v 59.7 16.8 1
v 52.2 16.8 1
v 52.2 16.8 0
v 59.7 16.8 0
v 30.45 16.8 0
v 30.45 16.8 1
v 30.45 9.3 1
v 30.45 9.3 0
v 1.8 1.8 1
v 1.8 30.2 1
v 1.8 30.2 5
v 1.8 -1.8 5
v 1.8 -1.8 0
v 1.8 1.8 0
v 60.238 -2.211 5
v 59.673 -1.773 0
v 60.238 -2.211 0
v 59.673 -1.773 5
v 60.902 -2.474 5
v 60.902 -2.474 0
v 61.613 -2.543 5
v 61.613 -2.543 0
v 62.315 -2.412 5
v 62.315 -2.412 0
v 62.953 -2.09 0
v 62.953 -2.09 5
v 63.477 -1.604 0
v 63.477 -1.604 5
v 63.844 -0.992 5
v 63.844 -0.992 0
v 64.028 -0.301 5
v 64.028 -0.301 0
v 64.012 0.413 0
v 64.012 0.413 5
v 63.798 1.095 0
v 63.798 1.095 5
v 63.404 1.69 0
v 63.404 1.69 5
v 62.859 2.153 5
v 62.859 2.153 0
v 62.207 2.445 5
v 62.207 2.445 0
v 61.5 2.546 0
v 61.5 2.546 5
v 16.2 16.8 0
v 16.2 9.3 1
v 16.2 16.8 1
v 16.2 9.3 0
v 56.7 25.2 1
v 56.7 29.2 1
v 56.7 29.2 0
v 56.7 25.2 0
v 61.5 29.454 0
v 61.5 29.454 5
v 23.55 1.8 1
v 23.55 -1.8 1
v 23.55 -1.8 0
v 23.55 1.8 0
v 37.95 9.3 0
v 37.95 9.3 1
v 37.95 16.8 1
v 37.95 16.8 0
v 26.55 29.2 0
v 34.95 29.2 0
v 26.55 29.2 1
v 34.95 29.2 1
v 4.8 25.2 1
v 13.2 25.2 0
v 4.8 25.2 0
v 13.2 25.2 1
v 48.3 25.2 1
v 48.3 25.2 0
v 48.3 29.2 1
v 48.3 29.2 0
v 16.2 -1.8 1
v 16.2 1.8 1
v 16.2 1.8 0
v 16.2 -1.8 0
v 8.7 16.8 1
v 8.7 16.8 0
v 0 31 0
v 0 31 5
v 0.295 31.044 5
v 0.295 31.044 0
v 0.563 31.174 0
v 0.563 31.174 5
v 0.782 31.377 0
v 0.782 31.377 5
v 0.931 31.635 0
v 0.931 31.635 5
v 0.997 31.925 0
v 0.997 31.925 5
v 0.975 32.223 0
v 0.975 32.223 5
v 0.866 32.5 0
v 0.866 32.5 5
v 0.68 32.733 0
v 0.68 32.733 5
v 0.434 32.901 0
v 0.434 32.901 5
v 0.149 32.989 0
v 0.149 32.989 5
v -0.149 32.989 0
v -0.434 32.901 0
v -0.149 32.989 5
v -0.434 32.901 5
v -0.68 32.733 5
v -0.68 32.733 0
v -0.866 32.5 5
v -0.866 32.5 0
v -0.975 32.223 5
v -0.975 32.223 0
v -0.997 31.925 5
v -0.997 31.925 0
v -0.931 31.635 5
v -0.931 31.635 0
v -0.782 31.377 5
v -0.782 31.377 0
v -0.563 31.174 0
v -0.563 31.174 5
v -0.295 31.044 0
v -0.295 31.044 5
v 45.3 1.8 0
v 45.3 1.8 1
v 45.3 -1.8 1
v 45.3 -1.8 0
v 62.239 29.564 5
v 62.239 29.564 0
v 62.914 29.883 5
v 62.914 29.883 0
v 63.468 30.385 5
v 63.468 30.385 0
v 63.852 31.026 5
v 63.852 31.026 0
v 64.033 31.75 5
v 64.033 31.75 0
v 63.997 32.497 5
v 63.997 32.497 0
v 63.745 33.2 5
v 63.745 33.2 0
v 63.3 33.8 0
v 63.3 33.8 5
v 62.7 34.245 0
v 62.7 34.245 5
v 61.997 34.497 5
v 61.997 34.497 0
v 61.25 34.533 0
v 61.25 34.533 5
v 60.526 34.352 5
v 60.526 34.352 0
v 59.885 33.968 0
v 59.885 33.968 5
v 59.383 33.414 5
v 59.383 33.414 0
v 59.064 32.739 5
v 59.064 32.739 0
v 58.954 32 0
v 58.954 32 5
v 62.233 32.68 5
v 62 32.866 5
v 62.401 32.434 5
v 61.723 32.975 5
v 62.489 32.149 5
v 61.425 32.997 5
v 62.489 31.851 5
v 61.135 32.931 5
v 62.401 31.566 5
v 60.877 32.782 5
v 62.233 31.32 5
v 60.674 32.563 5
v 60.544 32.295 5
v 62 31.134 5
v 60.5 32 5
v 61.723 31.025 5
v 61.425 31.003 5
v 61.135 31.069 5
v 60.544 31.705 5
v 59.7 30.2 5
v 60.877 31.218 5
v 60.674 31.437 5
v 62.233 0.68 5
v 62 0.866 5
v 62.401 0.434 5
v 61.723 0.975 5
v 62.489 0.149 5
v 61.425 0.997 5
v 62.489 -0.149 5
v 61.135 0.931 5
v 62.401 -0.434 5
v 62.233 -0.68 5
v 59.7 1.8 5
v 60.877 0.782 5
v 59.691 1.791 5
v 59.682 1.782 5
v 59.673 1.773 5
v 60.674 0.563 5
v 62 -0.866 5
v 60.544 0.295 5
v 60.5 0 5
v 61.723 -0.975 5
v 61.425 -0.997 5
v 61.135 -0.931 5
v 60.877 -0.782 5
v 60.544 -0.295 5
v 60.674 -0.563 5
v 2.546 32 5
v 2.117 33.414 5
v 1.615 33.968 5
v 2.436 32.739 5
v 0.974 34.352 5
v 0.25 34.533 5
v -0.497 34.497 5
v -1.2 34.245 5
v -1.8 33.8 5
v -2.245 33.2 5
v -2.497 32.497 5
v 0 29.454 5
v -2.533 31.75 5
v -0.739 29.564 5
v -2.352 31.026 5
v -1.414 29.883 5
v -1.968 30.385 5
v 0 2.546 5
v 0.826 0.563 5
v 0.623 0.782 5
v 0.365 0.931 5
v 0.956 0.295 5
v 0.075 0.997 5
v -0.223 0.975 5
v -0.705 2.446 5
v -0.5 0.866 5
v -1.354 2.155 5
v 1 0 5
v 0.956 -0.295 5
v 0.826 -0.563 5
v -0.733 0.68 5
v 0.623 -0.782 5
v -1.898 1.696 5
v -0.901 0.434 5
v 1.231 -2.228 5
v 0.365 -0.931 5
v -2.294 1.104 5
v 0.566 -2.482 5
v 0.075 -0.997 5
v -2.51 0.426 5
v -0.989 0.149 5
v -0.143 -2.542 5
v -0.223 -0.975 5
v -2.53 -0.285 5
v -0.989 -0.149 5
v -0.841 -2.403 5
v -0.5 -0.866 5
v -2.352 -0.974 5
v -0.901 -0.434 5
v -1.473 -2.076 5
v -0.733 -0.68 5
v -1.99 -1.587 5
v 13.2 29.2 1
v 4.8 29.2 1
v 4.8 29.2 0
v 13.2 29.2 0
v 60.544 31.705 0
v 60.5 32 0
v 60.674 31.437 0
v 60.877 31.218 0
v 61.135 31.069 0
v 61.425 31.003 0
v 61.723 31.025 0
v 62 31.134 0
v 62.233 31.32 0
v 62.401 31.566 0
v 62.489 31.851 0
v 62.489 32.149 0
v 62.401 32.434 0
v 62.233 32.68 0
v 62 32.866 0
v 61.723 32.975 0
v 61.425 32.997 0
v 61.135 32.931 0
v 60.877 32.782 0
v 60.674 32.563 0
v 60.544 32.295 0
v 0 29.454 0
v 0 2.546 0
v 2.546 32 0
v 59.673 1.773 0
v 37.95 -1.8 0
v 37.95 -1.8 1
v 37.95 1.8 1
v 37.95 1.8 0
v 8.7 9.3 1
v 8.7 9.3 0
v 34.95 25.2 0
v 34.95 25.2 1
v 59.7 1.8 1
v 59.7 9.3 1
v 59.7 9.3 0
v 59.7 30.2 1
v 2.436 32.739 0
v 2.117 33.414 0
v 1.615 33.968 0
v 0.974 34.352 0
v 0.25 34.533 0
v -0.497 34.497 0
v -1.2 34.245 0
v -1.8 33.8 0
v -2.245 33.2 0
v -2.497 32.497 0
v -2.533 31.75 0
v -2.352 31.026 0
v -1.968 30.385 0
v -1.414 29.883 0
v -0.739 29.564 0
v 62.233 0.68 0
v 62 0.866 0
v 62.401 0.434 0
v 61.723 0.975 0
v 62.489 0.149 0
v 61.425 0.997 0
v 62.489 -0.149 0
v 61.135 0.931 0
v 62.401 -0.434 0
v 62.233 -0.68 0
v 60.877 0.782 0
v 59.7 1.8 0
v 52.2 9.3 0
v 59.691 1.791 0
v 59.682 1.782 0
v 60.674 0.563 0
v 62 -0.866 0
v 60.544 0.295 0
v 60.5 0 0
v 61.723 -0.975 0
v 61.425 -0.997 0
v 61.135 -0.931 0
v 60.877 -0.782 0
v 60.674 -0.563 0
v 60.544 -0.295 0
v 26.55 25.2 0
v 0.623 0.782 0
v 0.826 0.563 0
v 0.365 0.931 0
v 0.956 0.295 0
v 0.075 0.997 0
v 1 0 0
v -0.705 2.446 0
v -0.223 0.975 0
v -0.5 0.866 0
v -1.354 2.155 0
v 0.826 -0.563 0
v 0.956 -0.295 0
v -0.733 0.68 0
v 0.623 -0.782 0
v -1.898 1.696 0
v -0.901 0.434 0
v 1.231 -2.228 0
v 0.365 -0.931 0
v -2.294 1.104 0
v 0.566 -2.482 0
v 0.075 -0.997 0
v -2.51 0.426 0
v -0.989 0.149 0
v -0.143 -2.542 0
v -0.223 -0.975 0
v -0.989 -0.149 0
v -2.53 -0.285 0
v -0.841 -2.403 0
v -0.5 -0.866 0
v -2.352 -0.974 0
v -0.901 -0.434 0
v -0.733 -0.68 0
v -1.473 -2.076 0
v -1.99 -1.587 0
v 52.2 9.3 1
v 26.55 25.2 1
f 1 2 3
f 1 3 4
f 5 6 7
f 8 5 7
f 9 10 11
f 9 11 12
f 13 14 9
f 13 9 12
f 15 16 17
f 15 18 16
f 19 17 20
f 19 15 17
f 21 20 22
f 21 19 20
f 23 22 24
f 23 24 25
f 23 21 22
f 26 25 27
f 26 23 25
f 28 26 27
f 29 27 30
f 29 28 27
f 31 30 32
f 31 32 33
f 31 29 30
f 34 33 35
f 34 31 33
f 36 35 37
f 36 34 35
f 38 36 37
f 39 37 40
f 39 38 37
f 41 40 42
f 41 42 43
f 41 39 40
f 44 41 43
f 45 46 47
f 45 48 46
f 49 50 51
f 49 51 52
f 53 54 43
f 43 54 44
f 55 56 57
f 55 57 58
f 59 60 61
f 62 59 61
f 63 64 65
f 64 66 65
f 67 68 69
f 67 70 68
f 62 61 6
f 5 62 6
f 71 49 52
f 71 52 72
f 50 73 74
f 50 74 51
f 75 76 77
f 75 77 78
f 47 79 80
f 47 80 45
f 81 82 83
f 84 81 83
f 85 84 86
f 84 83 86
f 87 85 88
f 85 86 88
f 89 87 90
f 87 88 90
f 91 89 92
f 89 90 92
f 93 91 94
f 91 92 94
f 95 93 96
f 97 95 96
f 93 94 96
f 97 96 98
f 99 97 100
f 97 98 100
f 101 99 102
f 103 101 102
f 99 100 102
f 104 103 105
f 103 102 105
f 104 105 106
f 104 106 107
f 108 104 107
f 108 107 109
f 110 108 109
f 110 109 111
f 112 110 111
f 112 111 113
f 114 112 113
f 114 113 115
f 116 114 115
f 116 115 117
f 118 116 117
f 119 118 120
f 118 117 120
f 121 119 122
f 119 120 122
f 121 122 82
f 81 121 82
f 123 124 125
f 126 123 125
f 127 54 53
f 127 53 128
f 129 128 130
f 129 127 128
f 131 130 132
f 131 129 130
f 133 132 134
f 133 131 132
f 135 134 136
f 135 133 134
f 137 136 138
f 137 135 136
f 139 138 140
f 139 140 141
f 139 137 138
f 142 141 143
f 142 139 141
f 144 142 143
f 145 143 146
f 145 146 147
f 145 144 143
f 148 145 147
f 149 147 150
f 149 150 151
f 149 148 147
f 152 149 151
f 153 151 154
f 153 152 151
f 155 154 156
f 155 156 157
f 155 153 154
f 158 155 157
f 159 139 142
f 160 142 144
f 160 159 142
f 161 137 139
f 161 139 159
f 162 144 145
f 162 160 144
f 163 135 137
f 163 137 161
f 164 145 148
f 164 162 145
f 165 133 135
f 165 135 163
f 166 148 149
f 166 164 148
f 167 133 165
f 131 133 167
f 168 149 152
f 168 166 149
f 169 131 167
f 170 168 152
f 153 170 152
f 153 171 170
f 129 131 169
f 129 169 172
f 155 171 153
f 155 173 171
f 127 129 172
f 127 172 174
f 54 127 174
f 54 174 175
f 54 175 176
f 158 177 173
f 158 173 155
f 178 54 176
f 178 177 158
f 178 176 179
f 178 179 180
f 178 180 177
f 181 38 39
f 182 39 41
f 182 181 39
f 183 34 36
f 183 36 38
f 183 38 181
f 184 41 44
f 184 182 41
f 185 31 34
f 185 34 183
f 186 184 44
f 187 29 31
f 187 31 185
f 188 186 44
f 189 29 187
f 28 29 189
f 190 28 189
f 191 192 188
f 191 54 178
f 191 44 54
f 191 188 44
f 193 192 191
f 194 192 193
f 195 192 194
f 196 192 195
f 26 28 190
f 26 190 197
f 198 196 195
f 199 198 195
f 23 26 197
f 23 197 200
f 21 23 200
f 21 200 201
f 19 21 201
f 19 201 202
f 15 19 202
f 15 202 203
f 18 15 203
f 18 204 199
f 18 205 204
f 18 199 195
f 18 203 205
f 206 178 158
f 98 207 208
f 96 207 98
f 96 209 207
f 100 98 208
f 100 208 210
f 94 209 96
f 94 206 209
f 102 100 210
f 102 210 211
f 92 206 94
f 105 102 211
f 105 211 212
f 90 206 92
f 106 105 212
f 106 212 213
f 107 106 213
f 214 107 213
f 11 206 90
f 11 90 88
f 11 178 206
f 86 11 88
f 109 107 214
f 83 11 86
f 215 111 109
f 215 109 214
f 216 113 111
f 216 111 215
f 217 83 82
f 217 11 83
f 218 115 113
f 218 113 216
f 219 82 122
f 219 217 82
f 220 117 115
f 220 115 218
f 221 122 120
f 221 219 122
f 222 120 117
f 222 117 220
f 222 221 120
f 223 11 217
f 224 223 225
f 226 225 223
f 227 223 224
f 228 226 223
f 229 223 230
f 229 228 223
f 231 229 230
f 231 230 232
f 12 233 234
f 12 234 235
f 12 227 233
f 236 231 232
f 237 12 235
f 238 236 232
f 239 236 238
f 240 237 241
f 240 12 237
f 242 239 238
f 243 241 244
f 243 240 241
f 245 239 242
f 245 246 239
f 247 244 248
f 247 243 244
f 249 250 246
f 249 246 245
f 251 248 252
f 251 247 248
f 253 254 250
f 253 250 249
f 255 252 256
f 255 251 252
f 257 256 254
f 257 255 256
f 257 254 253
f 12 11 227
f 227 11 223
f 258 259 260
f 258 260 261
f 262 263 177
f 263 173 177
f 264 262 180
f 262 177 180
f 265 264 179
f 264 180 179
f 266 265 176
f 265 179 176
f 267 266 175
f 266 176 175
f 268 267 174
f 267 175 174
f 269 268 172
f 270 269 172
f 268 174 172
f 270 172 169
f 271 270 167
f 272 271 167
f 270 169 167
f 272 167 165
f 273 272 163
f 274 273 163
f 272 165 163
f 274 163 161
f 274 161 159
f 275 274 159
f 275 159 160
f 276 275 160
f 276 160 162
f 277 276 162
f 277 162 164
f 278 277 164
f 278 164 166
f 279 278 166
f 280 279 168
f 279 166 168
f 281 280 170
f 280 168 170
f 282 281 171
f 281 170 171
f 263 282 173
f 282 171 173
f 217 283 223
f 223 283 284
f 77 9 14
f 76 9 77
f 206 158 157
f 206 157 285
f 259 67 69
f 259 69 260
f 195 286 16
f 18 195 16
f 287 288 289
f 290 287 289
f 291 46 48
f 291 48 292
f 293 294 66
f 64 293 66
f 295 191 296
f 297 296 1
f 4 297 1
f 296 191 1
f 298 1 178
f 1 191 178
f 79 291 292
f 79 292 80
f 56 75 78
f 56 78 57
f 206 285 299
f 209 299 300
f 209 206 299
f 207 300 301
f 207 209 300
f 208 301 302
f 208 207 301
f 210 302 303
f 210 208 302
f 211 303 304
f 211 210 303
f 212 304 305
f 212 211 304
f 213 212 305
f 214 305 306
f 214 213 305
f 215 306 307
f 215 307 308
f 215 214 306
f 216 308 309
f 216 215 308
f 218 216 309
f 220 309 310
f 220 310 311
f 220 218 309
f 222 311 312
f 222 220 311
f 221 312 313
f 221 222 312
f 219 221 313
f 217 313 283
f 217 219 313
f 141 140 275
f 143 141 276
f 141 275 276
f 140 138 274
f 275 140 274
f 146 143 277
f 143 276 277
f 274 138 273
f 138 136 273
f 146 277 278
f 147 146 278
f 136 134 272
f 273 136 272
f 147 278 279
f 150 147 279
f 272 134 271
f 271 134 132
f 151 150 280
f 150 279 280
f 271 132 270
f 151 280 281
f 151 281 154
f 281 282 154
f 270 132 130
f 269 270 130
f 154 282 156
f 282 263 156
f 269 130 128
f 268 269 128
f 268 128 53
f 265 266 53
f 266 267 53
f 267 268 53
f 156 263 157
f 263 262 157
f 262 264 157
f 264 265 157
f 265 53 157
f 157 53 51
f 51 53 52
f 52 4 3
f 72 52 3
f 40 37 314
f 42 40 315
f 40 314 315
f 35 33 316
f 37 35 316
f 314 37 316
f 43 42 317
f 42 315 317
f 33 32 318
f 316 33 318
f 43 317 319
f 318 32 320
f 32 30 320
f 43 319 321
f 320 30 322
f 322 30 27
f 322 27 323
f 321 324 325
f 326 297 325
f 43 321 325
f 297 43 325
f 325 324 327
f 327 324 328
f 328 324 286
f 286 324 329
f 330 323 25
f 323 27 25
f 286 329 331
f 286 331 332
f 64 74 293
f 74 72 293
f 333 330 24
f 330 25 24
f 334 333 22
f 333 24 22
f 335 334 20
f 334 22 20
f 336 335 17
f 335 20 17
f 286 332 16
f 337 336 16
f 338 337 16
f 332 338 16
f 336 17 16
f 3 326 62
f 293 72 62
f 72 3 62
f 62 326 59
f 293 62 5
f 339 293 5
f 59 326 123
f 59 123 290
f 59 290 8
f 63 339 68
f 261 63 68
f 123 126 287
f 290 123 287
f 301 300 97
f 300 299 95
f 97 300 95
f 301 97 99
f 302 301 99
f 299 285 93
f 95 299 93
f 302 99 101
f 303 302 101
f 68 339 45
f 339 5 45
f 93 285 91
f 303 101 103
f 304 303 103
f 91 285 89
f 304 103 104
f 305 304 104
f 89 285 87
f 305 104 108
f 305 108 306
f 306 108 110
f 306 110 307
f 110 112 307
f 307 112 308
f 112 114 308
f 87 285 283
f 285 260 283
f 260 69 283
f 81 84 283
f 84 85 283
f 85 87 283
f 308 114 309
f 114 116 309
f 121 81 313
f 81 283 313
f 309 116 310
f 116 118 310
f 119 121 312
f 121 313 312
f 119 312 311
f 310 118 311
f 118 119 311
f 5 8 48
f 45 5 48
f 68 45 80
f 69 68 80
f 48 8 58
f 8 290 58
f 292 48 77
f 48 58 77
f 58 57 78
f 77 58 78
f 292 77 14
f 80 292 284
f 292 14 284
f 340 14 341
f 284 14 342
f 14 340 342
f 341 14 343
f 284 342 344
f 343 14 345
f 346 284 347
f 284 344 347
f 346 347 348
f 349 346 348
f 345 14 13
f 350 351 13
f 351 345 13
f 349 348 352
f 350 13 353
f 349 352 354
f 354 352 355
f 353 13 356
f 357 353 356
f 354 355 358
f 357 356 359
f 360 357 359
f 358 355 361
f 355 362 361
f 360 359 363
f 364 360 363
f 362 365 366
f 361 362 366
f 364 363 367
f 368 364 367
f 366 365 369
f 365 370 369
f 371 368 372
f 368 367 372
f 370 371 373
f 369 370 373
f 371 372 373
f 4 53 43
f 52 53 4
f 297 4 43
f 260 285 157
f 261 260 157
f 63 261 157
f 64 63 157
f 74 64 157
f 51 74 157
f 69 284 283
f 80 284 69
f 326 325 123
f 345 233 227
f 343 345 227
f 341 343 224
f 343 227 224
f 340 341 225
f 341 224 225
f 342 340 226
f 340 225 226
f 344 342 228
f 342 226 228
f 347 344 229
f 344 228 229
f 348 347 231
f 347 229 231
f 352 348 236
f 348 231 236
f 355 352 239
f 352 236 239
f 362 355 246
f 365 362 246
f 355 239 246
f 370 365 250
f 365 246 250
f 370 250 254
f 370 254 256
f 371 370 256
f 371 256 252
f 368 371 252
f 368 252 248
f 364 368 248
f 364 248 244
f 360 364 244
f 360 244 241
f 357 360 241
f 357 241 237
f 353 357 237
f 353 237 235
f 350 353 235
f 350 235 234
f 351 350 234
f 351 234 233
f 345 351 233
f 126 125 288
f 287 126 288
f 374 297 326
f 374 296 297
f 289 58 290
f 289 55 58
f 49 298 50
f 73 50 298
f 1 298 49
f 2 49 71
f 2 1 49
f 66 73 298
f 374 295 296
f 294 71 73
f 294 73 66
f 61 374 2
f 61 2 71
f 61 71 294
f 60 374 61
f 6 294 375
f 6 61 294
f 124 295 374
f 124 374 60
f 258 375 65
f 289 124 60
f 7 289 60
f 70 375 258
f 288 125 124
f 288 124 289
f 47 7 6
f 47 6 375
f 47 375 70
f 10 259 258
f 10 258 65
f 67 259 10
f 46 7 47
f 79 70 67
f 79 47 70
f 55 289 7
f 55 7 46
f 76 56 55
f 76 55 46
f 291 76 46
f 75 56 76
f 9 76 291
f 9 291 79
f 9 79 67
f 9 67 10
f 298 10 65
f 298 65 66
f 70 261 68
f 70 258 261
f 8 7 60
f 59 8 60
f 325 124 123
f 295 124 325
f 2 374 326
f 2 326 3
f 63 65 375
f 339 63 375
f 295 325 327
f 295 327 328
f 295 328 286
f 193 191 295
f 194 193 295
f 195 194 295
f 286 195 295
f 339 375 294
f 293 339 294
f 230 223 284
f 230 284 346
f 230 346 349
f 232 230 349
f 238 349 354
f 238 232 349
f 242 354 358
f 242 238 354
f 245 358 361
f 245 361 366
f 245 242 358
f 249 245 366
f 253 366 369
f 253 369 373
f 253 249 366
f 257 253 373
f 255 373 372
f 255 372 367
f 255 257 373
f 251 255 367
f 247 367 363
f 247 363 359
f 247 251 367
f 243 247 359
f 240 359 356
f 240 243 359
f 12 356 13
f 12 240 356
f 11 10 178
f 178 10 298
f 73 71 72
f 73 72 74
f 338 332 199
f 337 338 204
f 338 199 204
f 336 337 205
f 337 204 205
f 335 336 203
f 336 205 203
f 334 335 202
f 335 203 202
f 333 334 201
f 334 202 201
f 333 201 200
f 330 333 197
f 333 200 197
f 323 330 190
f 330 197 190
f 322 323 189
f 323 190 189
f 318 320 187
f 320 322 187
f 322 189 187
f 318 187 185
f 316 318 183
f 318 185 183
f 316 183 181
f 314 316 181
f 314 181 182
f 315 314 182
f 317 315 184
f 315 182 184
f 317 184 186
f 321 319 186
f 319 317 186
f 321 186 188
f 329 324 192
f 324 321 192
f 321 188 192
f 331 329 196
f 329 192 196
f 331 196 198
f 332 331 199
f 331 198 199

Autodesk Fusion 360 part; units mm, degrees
sketch "Sketch1" plane through (0, 0, 0) normal (0, 0, 1) x (1, 0, 0)
  line L0 (0, 0) -> (18, 0)
  line L1 (18, 0) -> (18, 32)
  line L2 (18, 32) -> (0, 32)
  line L3 (0, 32) -> (0, 0)
  line L4 (1.8, 1.8) -> (16.2, 1.8)
  line L5 (16.2, 1.8) -> (16.2, 30.2)
  line L6 (16.2, 30.2) -> (1.8, 30.2)
  line L7 (1.8, 30.2) -> (1.8, 1.8)
  line L8 (1.8, 1.8) -> (1.8, 0)
  line L9 (16.2, 1.8) -> (16.2, 0)
  line L10 (1.8, 0) -> (1.8, -1.8)
  line L11 (16.2, 0) -> (16.2, -1.8)
  line L12 (16.2, 1.8) -> (18, 1.8)
  dimension "d1" = 18
  dimension "d2" = 32
  dimension "d3" = 28.4
  dimension "d4" = 14.4
  dimension "d5" = 1.8
  dimension "d6" = 1.8
extrude "Extrude1" add sketch "Sketch1" along normal blind 1 contours L4 L5 L6 L7 makes body 1
extrude "Extrude3" add sketch "Sketch1" along normal blind 5 separate body contours L0 L1 L2 L3 L5 L6 L7 L8 L12 | L0 L1 L9 L12 makes body 2
sketch "Sketch3" plane through (0, 30.2, 0) normal (0, -1, 0) x (1, 0, 0)
  line L0 (1.8, 0) -> (16.2, 0)
  line L1 (16.2, 0) -> (16.2, 5)
  line L2 (16.2, 5) -> (1.8, 5)
  line L3 (1.8, 5) -> (1.8, 0)
  line L4 (3.3, 1) -> (14.7, 1)
  line L5 (14.7, 1) -> (14.7, 4)
  line L6 (14.7, 4) -> (3.3, 4)
  line L7 (3.3, 4) -> (3.3, 1)
  dimension "d13" = 3
  dimension "d14" = 1.5
  dimension "d15" = 1.5
sketch "Sketch4" plane through (0, 0, 1) normal (0, 0, 1) x (-1, 0, 0)
  line L0 (-1.8, -30.2) -> (-1.8, -1.8)
  line L1 (-1.8, -1.8) -> (-16.2, -1.8)
  line L2 (-16.2, -1.8) -> (-16.2, -30.2)
  line L3 (-16.2, -30.2) -> (-1.8, -30.2)
  line L4 (-13.5403, -1.8) -> (-13.5403, -9.3)
  line L5 (-16.2, -9.3) -> (-8.7, -9.3)
  line L6 (-8.7, -9.3) -> (-8.7, -16.8)
  line L7 (-8.7, -16.8) -> (-16.2, -16.8)
  line L8 (-16.2, -16.8) -> (-16.2, -9.3)
  dimension "d18" = 7.5
  dimension "d19" = 7.5
  dimension "d20" = 7.5
extrude "Extrude5" cut sketch "Sketch4" against normal blind 1 contours L2 L5 L6 L7 L8 bodies 1
sketch "Sketch5" plane through (0, 0, 1) normal (0, 0, 1) x (-1, 0, 0)
  line L0 (-8.7, -16.8) -> (-16.2, -16.8)
  line L1 (-16.2, -16.8) -> (-16.2, -30.2)
  line L2 (-16.2, -30.2) -> (-1.8, -30.2)
  line L3 (-1.8, -30.2) -> (-1.8, -1.8)
  line L4 (-1.8, -1.8) -> (-16.2, -1.8)
  line L5 (-16.2, -1.8) -> (-16.2, -9.3)
  line L6 (-16.2, -9.3) -> (-8.7, -9.3)
  line L7 (-8.7, -9.3) -> (-8.7, -16.8)
  line L8 (-9, -30.2) -> (-9, -25.2) construction
  line L9 (-1.8, -25.2) -> (-4.8, -25.2) construction
  line L10 (-16.2, -25.2) -> (-13.2, -25.2) construction
  line L11 (-8.3545, -30.2) -> (-8.3545, -29.2)
  line L12 (-13.2, -25.2) -> (-4.8, -25.2)
  line L13 (-4.8, -25.2) -> (-4.8, -29.2)
  line L14 (-4.8, -29.2) -> (-13.2, -29.2)
  line L15 (-13.2, -29.2) -> (-13.2, -25.2)
  dimension "d24" = 3
  dimension "d25" = 3
  dimension "d26" = 1
  dimension "d27" = 5
  dimension "d28" = 4
sketch "Sketch7" plane through (0, 0, 5) normal (0, 0, 1) x (-1, 0, 0)
  line L0 (-16.2, -30.2) -> (-16.2, 0)
  line L1 (-16.2, 0) -> (-18, 0)
  line L2 (-18, 0) -> (-18, -32)
  line L3 (-18, -32) -> (0, -32)
  line L4 (0, -32) -> (0, 0)
  line L5 (0, 0) -> (-1.8, 0)
  line L6 (-1.8, 0) -> (-1.8, -30.2)
  line L7 (-1.8, -30.2) -> (-16.2, -30.2)
  line L8 (-16.2, -30.2) -> (-18, -30.2)
  line L9 (-16.2, 0) -> (-18, 0)
extrude "Extrude9" cut sketch "Sketch7" against normal blind 4 contours L0 L1 L2 L8 L9 bodies 2
combine "Combine2" operation add target body 2 tool bodies 1
extrude "Extrude6" cut sketch "Sketch5" against normal blind 1 contours L12 L13 L14 L15 bodies 2
sketch "Sketch9" plane through (0, 0, 1) normal (0, 0, 1) x (-1, 0, 0)
  line L0 (-4.8, -25.2) -> (-4.8, -29.2)
  line L1 (-4.8, -29.2) -> (-13.2, -29.2)
  line L2 (-13.2, -29.2) -> (-13.2, -25.2)
  line L3 (-13.2, -25.2) -> (-4.8, -25.2)
  line L4 (-16.2, -1.8) -> (-16.2, 0)
  line L5 (-16.2, 0) -> (-18, 0)
  line L6 (-18, 0) -> (-18, -30.2)
  line L7 (-18, -30.2) -> (-1.8, -30.2)
  line L8 (-1.8, -30.2) -> (-1.8, -1.8)
  line L9 (-1.8, -1.8) -> (-16.2, -1.8)
  line L10 (-16.2, -9.3) -> (-8.7, -9.3)
  line L11 (-8.7, -9.3) -> (-8.7, -16.8)
  line L12 (-8.7, -16.8) -> (-16.2, -16.8)
  line L13 (-16.2, -16.8) -> (-16.2, -9.3)
  line L14 (-9, -34.6502) -> (-30.75, -34.6502)
  line L15 (-30.75, -34.6502) -> (-52.5, -34.6502)
  line L16 (-52.5, -34.6502) -> (-59.7, -34.6502)
  line L17 (-59.7, -34.6502) -> (-61.5, -34.6502)
  line L18 (-18, -32) -> (-61.5, -32)
  line L19 (-61.5, -32) -> (-61.5, 0)
  line L20 (-61.5, 0) -> (-18, 0)
  line L21 (-18, 0) -> (-18, -32)
  line L22 (-9, -30.2) -> (-9, -25.2)
  line L23 (-18, -30.2) -> (-59.7, -30.2)
  line L24 (-59.7, -30.2) -> (-59.7, -1.8)
  line L25 (-59.7, -1.8) -> (-18, -1.8)
  line L26 (-18, -1.8) -> (-18, -30.2)
  line L27 (-59.7, -1.8) -> (-61.5, -1.8)
  line L28 (-41.625, -34.6502) -> (-41.625, -24)
  point P0 (-18, -32)
  dimension "d42" = 21.75
  dimension "d43" = 21.75
  dimension "d44" = 7.2
  dimension "d45" = 1.8
  dimension "d46" = 1.8
  dimension "d47" = 1.8
extrude "Extrude12" add sketch "Sketch9" against normal blind 1 contours L6 L21 L23 L24 L25 L26 bodies 2
extrude "Extrude13" add sketch "Sketch9" along normal blind 4 contours L18 L21 L23 L28 | L18 L19 L23 L24 L27 L28 bodies 2
extrude "Extrude14" add sketch "Sketch9" along normal blind 1 contours L18 L21 L23 L28 | L18 L19 L23 L24 L27 L28 bodies 2
sketch "Sketch10" plane through (0, 0, 1) normal (0, 0, -1) x (1, 0, 0)
  line L0 (59.7, -30.2) -> (18, -30.2)
  line L1 (18, -30.2) -> (18, -32)
  line L2 (18, -32) -> (61.5, -32)
  line L3 (61.5, -32) -> (61.5, -1.8)
  line L4 (61.5, -1.8) -> (59.7, -1.8)
  line L5 (59.7, -1.8) -> (59.7, -30.2)
extrude "Extrude15" add 1 faces at (46.4, 31.4, 1) along direction (0, 0, -1) blind 1 on bodies 2 bodies 2
sketch "Sketch11" plane through (0, 0, 1) normal (0, 0, 1) x (-1, 0, 0)
  line L0 (-4.8, -25.2) -> (-4.8, -29.2)
  line L1 (-4.8, -29.2) -> (-13.2, -29.2)
  line L2 (-13.2, -29.2) -> (-13.2, -25.2)
  line L3 (-13.2, -25.2) -> (-4.8, -25.2)
  line L4 (-16.2, -1.8) -> (-16.2, 0)
  line L5 (-16.2, 0) -> (-18, 0)
  line L6 (-18, 0) -> (-18, -1.8)
  line L7 (-18, -1.8) -> (-59.7, -1.8)
  line L8 (-59.7, -1.8) -> (-59.7, -30.2)
  line L9 (-59.7, -30.2) -> (-1.8, -30.2)
  line L10 (-1.8, -30.2) -> (-1.8, -1.8)
  line L11 (-1.8, -1.8) -> (-16.2, -1.8)
  line L12 (-16.2, -9.3) -> (-8.7, -9.3)
  line L13 (-8.7, -9.3) -> (-8.7, -16.8)
  line L14 (-8.7, -16.8) -> (-16.2, -16.8)
  line L15 (-16.2, -16.8) -> (-16.2, -9.3)
  line L16 (-9, -34.6502) -> (-30.75, -34.6502)
  line L17 (-30.75, -34.6502) -> (-52.5, -34.6502)
  line L18 (-52.5, -34.6502) -> (-59.7, -34.6502)
  line L19 (-59.7, -34.6502) -> (-61.5, -34.6502)
  line L20 (-9, -30.2) -> (-9, -25.2)
  line L21 (-19.875, -34.6502) -> (-19.875, -25)
  line L22 (-41.625, -34.6502) -> (-41.625, -25)
  line L23 (-26.55, -25.2) -> (-34.95, -25.2)
  line L24 (-34.95, -29.2) -> (-26.55, -29.2)
  line L25 (-34.95, -25.2) -> (-34.95, -29.2)
  line L26 (-26.55, -29.2) -> (-26.55, -25.2)
  line L27 (-56.7, -25.2) -> (-48.3, -25.2)
  line L28 (-56.7, -29.2) -> (-56.7, -25.2)
  line L29 (-48.3, -29.2) -> (-56.7, -29.2)
  line L30 (-48.3, -25.2) -> (-48.3, -29.2)
  line L31 (-16.2, -1.8) -> (-18, -1.8)
  line L32 (-12.45, -25.1815) -> (-12.45, -9.3) construction
  line L33 (-34.2, -25.2) -> (-34.2, -21.3798)
  line L34 (-12.45, -25.1815) -> (-34.2, -25.2) construction
  line L35 (-23.325, -25.1907) -> (-23.325, -13.8088) construction
  line L36 (-34.2, -25.2) -> (-55.95, -25.2) construction
  line L37 (-45.075, -25.2) -> (-45.075, -12.6632) construction
  line L38 (-37.95, -16.8) -> (-30.45, -16.8)
  line L39 (-30.45, -16.8) -> (-30.45, -9.3)
  line L40 (-30.45, -9.3) -> (-37.95, -9.3)
  line L41 (-37.95, -9.3) -> (-37.95, -16.8)
  line L42 (-52.2, -16.8) -> (-59.7, -16.8)
  line L43 (-52.2, -9.3) -> (-52.2, -16.8)
  line L44 (-59.7, -9.3) -> (-52.2, -9.3)
  line L45 (-59.7, -16.8) -> (-59.7, -9.3)
  dimension "d64" = 0.75
  dimension "d65" = 21.75
extrude "Extrude16" cut sketch "Sketch11" against normal blind 1 contours L23 L24 L25 L26 | L27 L28 L29 L30 bodies 2
extrude "Extrude17" cut sketch "Sketch11" against normal blind 1 contours L4 L5 L6 L31 bodies 2
extrude "Extrude19" cut sketch "Sketch11" against normal blind 1 contours L8 L42 L43 L44 L45 | L38 L39 L40 L41 bodies 2
sketch "Sketch12" plane through (0, 0, 5) normal (0, 0, 1) x (-1, 0, 0)
  line L0 (-1.8, -30.2) -> (-59.7, -30.2)
  line L1 (-59.7, -30.2) -> (-59.7, -1.8)
  line L2 (-59.7, -1.8) -> (-61.5, -1.8)
  line L3 (-61.5, -1.8) -> (-61.5, -32)
  line L4 (-61.5, -32) -> (0, -32)
  line L5 (0, -32) -> (0, 0)
  line L6 (0, 0) -> (-1.8, 0)
  line L7 (-1.8, 0) -> (-1.8, -30.2)
  line L8 (-59.7, -1.8) -> (-61.5, -1.8)
  line L9 (-61.5, -1.8) -> (-61.5, 0)
  line L10 (-61.5, 0) -> (-59.7, 0)
  line L11 (-59.7, 0) -> (-59.7, -1.8)
  dimension "d70" = 1.8
  dimension "d71" = 1.8
extrude "Extrude20" add sketch "Sketch12" against normal blind 5 contours L2 L8 L9 L10 L11 bodies 2
sketch "Sketch13" plane through (0, 0, 5) normal (0, 0, 1) x (-1, 0, 0)
  line L0 (-1.8, -30.2) -> (-59.7, -30.2)
  line L1 (-59.7, -30.2) -> (-59.7, 0)
  line L2 (-59.7, 0) -> (-61.5, 0)
  line L3 (-61.5, 0) -> (-61.5, -32)
  line L4 (-61.5, -32) -> (0, -32)
  line L5 (0, -32) -> (0, 0)
  line L6 (0, 0) -> (-1.8, 0)
  line L7 (-1.8, 0) -> (-1.8, -30.2)
  line L8 (-1.8, -1.8) -> (-59.7, -1.8)
  circle A0 centre (0, 0) radius 2.5456
  circle A1 centre (0, -32) radius 2.5456
  circle A2 centre (-61.5, 0) radius 2.5456
  circle A3 centre (-61.5, -32) radius 2.5456
  circle A4 centre (-61.5, 0) radius 1
  circle A5 centre (-61.5, -32) radius 1
  circle A6 centre (0, 0) radius 1
  circle A7 centre (0, -32) radius 1
  line L9 (-1.8, -1.8) -> (-1.8, 1.8)
  line L10 (-59.6731, -1.7885) -> (-59.6731, 1.7727)
  dimension "d74" = 2
  dimension "d75" = 2
  dimension "d76" = 2
  dimension "d77" = 2
extrude "Extrude21" add sketch "Sketch13" against normal blind 5 contours L4 L5 A1 A7 | L1 L2 L3 A2 A4 L10 | L3 L4 A3 A5 | L5 L6 A0 A6 L9 picked at (2.0172, -32.1761) picked at (-60.086, -33.4496) bodies 2
extrude "Extrude22" cut sketch "Sketch13" against normal blind 5 contours L4 L5 A7 | L3 L4 A5 | L5 L6 A6 | L2 L3 A4 picked at (-0.6633, -31.9526) picked at (-60.8502, -31.8587) picked at (-0.0474, -0.6633) picked at (-60.9677, -0.3985) bodies 2
sketch "Sketch14" plane through (0, 0, 1) normal (0, 0, 1) x (-1, 0, 0)
  line L0 (-52.2, -16.8) -> (-59.7, -16.8)
  line L1 (-59.7, -16.8) -> (-59.7, -30.2)
  line L2 (-59.7, -30.2) -> (-1.8, -30.2)
  line L3 (-1.8, -30.2) -> (-1.8, -1.8)
  line L4 (-1.8, -1.8) -> (-59.7, -1.8)
  line L5 (-59.7, -1.8) -> (-59.7, -9.3)
  line L6 (-59.7, -9.3) -> (-52.2, -9.3)
  line L7 (-52.2, -9.3) -> (-52.2, -16.8)
  line L8 (-30.45, -16.8) -> (-37.95, -16.8)
  line L9 (-37.95, -16.8) -> (-37.95, -9.3)
  line L10 (-37.95, -9.3) -> (-30.45, -9.3)
  line L11 (-30.45, -9.3) -> (-30.45, -16.8)
  line L12 (-34.95, -25.2) -> (-26.55, -25.2)
  line L13 (-26.55, -25.2) -> (-26.55, -29.2)
  line L14 (-26.55, -29.2) -> (-34.95, -29.2)
  line L15 (-34.95, -29.2) -> (-34.95, -25.2)
  line L16 (-56.7, -29.2) -> (-56.7, -25.2)
  line L17 (-56.7, -25.2) -> (-48.3, -25.2)
  line L18 (-48.3, -25.2) -> (-48.3, -29.2)
  line L19 (-48.3, -29.2) -> (-56.7, -29.2)
  line L20 (-4.8, -25.2) -> (-4.8, -29.2)
  line L21 (-4.8, -29.2) -> (-13.2, -29.2)
  line L22 (-13.2, -29.2) -> (-13.2, -25.2)
  line L23 (-13.2, -25.2) -> (-4.8, -25.2)
  line L24 (-16.2, -9.3) -> (-8.7, -9.3)
  line L25 (-8.7, -9.3) -> (-8.7, -16.8)
  line L26 (-8.7, -16.8) -> (-16.2, -16.8)
  line L27 (-16.2, -16.8) -> (-16.2, -9.3)
  line L28 (-13.2, -27.2) -> (-16.2, -27.2)
  line L29 (-16.2, -27.2) -> (-16.2, -1.8)
  line L30 (-16.2, -1.8) -> (-16.2, 1.8)
  line L31 (-26.55, -27.2) -> (-23.55, -27.2)
  line L32 (-16.2, 1.8) -> (-23.55, 1.8)
  line L33 (-23.55, 1.8) -> (-23.55, -1.8)
  line L34 (-30.75, -29.2) -> (-30.75, -25.2)
  line L35 (-16.2, -1.8) -> (-23.55, -1.8)
  line L36 (-37.95, 1.8) -> (-37.95, -1.8)
  line L37 (-45.3, -1.8) -> (-37.95, -1.8)
  line L38 (-45.3, 1.8) -> (-37.95, 1.8)
  line L39 (-45.3, -1.8) -> (-45.3, 1.8)
  dimension "d82" = 3
  dimension "d83" = 3.6
  dimension "d84" = 3
  dimension "d85" = 7.35
extrude "Extrude23" add sketch "Sketch14" against normal blind 1 contours L4 L36 L37 L38 L39 | L4 L30 L32 L33 L35 bodies 2
sketch "Sketch15" plane through (0, 0, 0) normal (0, 0, -1) x (1, 0, 0)
  line L0 (26.55, -25.2) -> (34.95, -25.2)
  line L1 (34.95, -25.2) -> (34.95, -29.2)
  line L2 (34.95, -29.2) -> (26.55, -29.2)
  line L3 (26.55, -29.2) -> (26.55, -25.2)
  line L4 (56.7, -25.2) -> (56.7, -29.2)
  line L5 (56.7, -29.2) -> (48.3, -29.2)
  line L6 (48.3, -29.2) -> (48.3, -25.2)
  line L7 (48.3, -25.2) -> (56.7, -25.2)
  line L8 (4.8, -29.2) -> (4.8, -25.2)
  line L9 (4.8, -25.2) -> (13.2, -25.2)
  line L10 (13.2, -25.2) -> (13.2, -29.2)
  line L11 (13.2, -29.2) -> (4.8, -29.2)
  line L12 (16.2, -9.3) -> (16.2, -16.8)
  line L13 (16.2, -16.8) -> (8.7, -16.8)
  line L14 (8.7, -16.8) -> (8.7, -9.3)
  line L15 (8.7, -9.3) -> (16.2, -9.3)
  line L16 (1.8, -1.8) -> (1.8, 1.8)
  arc A0 (1.8, 1.8) -> (0, -2.5456) centre (0, 0) ccw
  line L17 (0, -2.5456) -> (0, -29.4544)
  arc A1 (0, -29.4544) -> (2.5456, -32) centre (0, -32) ccw
  line L18 (2.5456, -32) -> (58.9544, -32)
  arc A2 (58.9544, -32) -> (61.5, -29.4544) centre (61.5, -32) ccw
  line L19 (61.5, -29.4544) -> (61.5, -2.5456)
  arc A3 (61.5, -2.5456) -> (59.6731, 1.7727) centre (61.5, 0) ccw
  line L20 (59.6731, 1.7727) -> (59.6731, -1.7727)
  arc A4 (59.6731, -1.7727) -> (59.7, -1.8) centre (61.5, 0) ccw
  line L21 (59.7, -1.8) -> (45.3, -1.8)
  line L22 (45.3, -1.8) -> (45.3, 1.8)
  line L23 (45.3, 1.8) -> (37.95, 1.8)
  line L24 (37.95, 1.8) -> (37.95, -1.8)
  line L25 (37.95, -1.8) -> (23.55, -1.8)
  line L26 (23.55, -1.8) -> (23.55, 1.8)
  line L27 (23.55, 1.8) -> (16.2, 1.8)
  line L28 (16.2, 1.8) -> (16.2, -1.8)
  line L29 (16.2, -1.8) -> (1.8, -1.8)
  line L30 (52.2, -16.8) -> (52.2, -9.3)
  line L31 (52.2, -9.3) -> (59.7, -9.3)
  line L32 (59.7, -9.3) -> (59.7, -16.8)
  line L33 (59.7, -16.8) -> (52.2, -16.8)
  line L34 (37.95, -16.8) -> (30.45, -16.8)
  line L35 (30.45, -16.8) -> (30.45, -9.3)
  line L36 (30.45, -9.3) -> (37.95, -9.3)
  line L37 (37.95, -9.3) -> (37.95, -16.8)
  circle A5 centre (0, -32) radius 1
  circle A6 centre (61.5, 0) radius 1
  circle A7 centre (0, 0) radius 1
  circle A8 centre (61.5, -32) radius 1
  line L38 (30.75, -29.2) -> (30.75, -25.2) construction
  line L39 (34.95, -27.2) -> (26.55, -27.2) construction
  circle A9 centre (30.75, -27.2) radius 1
  dimension "d88" = 2
sketch "Sketch16" plane through (0, 0, 1) normal (0, 0, 1) x (-1, 0, 0)
  line L0 (-52.2, -16.8) -> (-59.7, -16.8)
  line L1 (-59.7, -16.8) -> (-59.7, -30.2)
  line L2 (-59.7, -30.2) -> (-1.8, -30.2)
  line L3 (-1.8, -30.2) -> (-1.8, -1.8)
  line L4 (-1.8, -1.8) -> (-16.2, -1.8)
  line L5 (-16.2, -1.8) -> (-16.2, 1.8)
  line L6 (-16.2, 1.8) -> (-23.55, 1.8)
  line L7 (-23.55, 1.8) -> (-23.55, -1.8)
  line L8 (-23.55, -1.8) -> (-37.95, -1.8)
  line L9 (-37.95, -1.8) -> (-37.95, 1.8)
  line L10 (-37.95, 1.8) -> (-45.3, 1.8)
  line L11 (-45.3, 1.8) -> (-45.3, -1.8)
  line L12 (-45.3, -1.8) -> (-59.7, -1.8)
  line L13 (-59.7, -1.8) -> (-59.7, -9.3)
  line L14 (-59.7, -9.3) -> (-52.2, -9.3)
  line L15 (-52.2, -9.3) -> (-52.2, -16.8)
  line L16 (-30.45, -16.8) -> (-37.95, -16.8)
  line L17 (-37.95, -16.8) -> (-37.95, -9.3)
  line L18 (-37.95, -9.3) -> (-30.45, -9.3)
  line L19 (-30.45, -9.3) -> (-30.45, -16.8)
  line L20 (-34.95, -25.2) -> (-26.55, -25.2)
  line L21 (-26.55, -25.2) -> (-26.55, -29.2)
  line L22 (-26.55, -29.2) -> (-34.95, -29.2)
  line L23 (-34.95, -29.2) -> (-34.95, -25.2)
  line L24 (-56.7, -29.2) -> (-56.7, -25.2)
  line L25 (-56.7, -25.2) -> (-48.3, -25.2)
  line L26 (-48.3, -25.2) -> (-48.3, -29.2)
  line L27 (-48.3, -29.2) -> (-56.7, -29.2)
  line L28 (-4.8, -25.2) -> (-4.8, -29.2)
  line L29 (-4.8, -29.2) -> (-13.2, -29.2)
  line L30 (-13.2, -29.2) -> (-13.2, -25.2)
  line L31 (-13.2, -25.2) -> (-4.8, -25.2)
  line L32 (-16.2, -9.3) -> (-8.7, -9.3)
  line L33 (-8.7, -9.3) -> (-8.7, -16.8)
  line L34 (-8.7, -16.8) -> (-16.2, -16.8)
  line L35 (-16.2, -16.8) -> (-16.2, -9.3)
  line L36 (-34.2, -16.8) -> (-34.2, -9.3) construction
  line L37 (-30.45, -13.05) -> (-37.95, -13.05) construction
  circle A0 centre (-34.2, -13.05) radius 1
  dimension "d89" = 2
